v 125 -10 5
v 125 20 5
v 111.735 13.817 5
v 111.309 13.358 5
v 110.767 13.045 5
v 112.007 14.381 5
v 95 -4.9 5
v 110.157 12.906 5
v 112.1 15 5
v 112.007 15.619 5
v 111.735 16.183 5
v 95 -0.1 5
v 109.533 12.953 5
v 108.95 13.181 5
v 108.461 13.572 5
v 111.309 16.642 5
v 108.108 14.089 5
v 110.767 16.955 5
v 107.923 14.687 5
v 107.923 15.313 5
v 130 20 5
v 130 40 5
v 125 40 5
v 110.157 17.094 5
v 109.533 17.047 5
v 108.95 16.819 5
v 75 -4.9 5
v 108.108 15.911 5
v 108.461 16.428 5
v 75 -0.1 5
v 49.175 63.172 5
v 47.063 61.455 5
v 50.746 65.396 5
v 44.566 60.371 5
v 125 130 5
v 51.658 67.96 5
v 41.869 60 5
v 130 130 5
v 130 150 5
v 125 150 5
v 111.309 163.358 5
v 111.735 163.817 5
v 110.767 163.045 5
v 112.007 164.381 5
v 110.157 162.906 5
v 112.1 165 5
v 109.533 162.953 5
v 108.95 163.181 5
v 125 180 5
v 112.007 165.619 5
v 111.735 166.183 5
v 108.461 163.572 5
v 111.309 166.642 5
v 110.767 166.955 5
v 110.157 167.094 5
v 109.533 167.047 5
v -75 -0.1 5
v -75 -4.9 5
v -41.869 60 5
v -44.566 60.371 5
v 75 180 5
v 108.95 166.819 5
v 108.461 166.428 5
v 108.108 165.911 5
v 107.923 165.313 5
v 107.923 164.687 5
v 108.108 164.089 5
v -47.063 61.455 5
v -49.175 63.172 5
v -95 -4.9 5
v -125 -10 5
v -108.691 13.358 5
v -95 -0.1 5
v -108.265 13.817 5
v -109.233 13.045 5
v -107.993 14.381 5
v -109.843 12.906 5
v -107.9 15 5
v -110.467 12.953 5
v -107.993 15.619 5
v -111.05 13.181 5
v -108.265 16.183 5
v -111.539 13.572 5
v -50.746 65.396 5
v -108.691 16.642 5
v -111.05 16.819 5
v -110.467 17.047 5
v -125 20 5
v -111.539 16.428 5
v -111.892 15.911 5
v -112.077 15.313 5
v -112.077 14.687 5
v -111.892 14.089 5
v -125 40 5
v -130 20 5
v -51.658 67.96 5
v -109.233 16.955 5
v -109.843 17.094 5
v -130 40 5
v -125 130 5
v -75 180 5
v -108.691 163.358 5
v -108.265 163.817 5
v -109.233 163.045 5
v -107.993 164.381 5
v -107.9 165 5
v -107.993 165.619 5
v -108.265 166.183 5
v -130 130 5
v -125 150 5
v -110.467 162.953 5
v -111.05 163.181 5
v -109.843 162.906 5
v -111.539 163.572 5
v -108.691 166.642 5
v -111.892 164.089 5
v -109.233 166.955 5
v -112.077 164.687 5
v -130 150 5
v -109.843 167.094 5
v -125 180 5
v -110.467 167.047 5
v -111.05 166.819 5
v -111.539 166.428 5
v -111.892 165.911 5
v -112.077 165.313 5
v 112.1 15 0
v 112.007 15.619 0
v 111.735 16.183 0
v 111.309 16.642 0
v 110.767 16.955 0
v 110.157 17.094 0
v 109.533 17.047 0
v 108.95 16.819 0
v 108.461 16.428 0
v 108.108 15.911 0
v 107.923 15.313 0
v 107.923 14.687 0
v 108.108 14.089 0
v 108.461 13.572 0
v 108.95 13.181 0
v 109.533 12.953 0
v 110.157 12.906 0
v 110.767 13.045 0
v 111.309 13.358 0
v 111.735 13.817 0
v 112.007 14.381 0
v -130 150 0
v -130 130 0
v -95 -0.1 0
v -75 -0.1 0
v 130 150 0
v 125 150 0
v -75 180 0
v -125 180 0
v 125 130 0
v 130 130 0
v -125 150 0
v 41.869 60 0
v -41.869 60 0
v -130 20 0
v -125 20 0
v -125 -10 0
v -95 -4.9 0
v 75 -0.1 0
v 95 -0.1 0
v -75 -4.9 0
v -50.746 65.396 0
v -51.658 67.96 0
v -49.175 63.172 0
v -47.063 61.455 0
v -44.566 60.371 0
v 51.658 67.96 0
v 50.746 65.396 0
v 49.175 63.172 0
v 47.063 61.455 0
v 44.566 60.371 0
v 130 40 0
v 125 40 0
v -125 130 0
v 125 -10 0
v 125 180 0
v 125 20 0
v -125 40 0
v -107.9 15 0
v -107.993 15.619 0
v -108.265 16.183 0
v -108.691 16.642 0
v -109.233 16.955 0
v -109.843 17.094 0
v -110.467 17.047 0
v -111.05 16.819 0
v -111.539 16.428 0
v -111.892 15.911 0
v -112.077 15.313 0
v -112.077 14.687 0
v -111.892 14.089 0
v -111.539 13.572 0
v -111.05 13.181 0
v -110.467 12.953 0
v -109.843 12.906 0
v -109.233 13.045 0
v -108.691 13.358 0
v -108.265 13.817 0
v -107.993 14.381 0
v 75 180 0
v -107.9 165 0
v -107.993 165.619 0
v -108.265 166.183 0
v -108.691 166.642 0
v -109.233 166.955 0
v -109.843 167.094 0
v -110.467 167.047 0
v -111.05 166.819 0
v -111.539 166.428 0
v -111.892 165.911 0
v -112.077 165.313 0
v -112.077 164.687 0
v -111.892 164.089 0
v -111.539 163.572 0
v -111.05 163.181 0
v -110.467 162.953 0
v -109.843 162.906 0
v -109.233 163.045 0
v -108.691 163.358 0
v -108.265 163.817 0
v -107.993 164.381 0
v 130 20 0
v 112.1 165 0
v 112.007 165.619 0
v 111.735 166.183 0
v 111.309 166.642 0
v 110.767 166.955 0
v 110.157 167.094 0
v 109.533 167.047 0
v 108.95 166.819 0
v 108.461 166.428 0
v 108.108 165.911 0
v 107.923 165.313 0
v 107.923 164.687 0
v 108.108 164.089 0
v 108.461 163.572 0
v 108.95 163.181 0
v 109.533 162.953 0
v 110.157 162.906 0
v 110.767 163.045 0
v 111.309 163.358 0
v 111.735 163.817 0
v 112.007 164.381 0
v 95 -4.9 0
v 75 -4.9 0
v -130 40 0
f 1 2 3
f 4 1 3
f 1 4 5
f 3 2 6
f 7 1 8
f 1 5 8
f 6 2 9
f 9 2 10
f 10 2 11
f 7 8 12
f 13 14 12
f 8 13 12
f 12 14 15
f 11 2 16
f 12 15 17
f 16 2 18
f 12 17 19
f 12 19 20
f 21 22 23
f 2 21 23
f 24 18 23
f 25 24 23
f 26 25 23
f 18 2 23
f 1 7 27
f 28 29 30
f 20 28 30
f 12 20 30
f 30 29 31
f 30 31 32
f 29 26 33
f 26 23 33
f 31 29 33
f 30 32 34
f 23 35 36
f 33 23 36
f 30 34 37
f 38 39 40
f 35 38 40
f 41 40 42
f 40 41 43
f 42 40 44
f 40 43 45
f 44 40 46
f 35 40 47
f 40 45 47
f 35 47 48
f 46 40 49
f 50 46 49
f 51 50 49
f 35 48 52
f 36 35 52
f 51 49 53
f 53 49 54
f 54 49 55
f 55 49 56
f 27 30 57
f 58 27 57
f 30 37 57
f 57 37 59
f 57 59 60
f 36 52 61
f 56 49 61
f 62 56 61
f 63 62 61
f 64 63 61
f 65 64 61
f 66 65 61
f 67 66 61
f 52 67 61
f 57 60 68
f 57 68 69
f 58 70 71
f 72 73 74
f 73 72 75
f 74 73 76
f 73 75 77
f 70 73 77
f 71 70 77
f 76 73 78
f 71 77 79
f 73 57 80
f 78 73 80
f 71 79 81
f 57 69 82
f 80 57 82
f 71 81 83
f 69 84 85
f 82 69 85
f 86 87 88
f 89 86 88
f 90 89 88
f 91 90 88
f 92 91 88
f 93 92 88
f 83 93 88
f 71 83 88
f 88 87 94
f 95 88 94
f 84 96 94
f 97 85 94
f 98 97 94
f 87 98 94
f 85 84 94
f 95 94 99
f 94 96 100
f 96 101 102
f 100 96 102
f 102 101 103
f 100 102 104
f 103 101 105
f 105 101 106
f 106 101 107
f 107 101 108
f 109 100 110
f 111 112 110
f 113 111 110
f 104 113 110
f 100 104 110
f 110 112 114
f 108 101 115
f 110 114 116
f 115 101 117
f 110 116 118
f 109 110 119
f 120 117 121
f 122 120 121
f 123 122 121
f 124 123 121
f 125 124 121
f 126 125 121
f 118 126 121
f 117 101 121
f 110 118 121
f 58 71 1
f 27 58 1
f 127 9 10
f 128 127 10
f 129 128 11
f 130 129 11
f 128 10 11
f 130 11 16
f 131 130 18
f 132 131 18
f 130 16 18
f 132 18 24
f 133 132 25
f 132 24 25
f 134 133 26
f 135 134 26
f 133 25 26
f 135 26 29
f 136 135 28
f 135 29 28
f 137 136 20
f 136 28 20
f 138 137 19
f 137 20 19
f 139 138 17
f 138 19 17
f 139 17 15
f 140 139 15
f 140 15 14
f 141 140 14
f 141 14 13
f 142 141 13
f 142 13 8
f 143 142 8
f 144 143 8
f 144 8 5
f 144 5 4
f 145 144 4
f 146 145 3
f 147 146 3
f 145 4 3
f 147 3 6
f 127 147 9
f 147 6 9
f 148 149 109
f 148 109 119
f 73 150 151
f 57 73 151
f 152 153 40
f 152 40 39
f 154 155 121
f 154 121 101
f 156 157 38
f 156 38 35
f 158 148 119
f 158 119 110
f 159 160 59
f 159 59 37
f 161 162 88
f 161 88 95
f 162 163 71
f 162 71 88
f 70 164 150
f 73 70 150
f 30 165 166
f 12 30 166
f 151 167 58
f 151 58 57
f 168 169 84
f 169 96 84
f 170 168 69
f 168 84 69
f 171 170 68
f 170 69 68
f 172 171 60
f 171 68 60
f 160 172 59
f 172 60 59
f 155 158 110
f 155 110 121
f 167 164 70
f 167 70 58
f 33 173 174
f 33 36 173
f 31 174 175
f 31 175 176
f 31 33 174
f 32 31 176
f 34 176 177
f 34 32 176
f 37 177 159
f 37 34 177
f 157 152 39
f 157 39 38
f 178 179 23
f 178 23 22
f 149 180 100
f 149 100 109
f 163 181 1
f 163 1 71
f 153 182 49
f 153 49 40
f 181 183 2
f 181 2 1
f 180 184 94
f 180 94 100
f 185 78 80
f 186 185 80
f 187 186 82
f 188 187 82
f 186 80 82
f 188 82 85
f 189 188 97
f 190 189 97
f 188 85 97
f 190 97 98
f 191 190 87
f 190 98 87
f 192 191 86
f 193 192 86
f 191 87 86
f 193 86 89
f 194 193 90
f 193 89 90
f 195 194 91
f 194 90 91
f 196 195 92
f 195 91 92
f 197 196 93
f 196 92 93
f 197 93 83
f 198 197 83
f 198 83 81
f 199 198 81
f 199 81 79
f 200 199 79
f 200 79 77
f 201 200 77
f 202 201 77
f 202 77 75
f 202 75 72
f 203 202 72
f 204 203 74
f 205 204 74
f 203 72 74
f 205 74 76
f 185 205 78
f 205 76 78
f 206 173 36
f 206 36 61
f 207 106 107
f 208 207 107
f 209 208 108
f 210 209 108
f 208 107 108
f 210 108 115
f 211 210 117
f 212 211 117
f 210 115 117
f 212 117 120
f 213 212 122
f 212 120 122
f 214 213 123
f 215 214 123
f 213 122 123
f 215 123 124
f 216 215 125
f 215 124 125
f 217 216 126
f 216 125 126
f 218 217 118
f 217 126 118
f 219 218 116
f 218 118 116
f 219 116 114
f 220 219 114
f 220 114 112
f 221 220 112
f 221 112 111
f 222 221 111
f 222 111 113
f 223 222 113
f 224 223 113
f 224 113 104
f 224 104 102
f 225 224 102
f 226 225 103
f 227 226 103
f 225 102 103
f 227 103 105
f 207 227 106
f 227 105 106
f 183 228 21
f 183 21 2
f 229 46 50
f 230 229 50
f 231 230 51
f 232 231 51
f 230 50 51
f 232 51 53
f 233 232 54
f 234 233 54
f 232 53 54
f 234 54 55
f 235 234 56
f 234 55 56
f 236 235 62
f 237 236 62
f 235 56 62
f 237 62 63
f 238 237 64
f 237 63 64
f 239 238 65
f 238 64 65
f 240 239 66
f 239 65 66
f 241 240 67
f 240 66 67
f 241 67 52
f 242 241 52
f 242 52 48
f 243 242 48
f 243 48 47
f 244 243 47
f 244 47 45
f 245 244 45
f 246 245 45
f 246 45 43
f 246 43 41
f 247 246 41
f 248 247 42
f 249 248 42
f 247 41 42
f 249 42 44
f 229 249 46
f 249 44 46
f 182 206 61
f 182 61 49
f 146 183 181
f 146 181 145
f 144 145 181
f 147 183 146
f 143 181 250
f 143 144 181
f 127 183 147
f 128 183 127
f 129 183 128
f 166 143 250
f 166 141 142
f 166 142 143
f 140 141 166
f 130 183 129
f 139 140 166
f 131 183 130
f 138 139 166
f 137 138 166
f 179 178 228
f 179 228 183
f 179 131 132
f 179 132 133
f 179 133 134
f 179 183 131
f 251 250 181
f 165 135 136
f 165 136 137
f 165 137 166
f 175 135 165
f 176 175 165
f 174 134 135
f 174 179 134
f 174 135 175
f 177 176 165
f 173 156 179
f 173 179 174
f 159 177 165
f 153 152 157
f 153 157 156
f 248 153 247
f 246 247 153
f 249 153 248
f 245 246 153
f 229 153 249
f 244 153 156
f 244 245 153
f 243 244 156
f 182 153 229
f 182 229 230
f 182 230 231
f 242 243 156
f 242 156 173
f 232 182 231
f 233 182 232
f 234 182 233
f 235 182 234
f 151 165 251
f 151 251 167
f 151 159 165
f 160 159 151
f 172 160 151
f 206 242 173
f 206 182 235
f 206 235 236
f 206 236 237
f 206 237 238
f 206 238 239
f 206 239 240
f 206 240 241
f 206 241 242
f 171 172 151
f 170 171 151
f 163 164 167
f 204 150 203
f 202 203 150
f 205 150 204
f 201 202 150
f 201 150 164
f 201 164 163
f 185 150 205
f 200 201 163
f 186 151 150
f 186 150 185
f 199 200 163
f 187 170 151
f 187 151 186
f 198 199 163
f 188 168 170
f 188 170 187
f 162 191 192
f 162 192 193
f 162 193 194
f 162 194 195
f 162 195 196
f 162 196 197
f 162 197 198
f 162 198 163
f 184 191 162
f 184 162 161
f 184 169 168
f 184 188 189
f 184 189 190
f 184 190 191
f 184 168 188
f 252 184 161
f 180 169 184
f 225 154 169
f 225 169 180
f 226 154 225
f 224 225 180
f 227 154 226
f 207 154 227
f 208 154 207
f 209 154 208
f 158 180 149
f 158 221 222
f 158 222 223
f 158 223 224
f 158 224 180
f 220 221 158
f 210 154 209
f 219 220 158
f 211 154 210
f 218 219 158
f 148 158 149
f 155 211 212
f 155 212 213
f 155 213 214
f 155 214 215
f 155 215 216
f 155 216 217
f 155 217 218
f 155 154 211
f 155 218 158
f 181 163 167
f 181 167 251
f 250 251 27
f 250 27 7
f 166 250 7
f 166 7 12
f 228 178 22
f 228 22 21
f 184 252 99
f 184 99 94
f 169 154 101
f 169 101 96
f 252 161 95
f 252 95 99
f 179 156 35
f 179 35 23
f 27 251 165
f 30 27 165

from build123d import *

# Parameters (mm, degrees)
SKETCH1_W           = 20
SKETCH1_H           = 4.8
BOSS_EXTRUDE1_DEPTH = 5
FILLET1_R           = 10
SKETCH2_R           = 2.1
CUT_EXTRUDE1_DEPTH  = 5


with BuildPart() as part:
    # Sketch1 → Boss-Extrude1 (new body)
    with BuildSketch(Plane.XY):
        Polygon((125.000000001, -10), (-124.999999999, -10), (-124.999999999, 20), (-129.999999999, 20), (-129.999999999, 40), (-124.999999999, 40), (-124.999999999, 130), (-129.999999999, 130), (-129.999999999, 150), (-124.999999999, 150), (-124.999999999, 180), (-74.999999999, 180), (-50, 60), (50, 60), (75.000000001, 180), (125.000000001, 180), (125.000000001, 150), (130.000000001, 150), (130.000000001, 130), (125.000000001, 130), (125.000000001, 40), (130.000000001, 40), (130.000000001, 20), (125.000000001, 20), align=None)
        with Locations((85.000000001, -2.5)):
            Rectangle(SKETCH1_W, SKETCH1_H, mode=Mode.SUBTRACT)
        with Locations((-84.999999999, -2.5)):
            Rectangle(SKETCH1_W, SKETCH1_H, mode=Mode.SUBTRACT)
    extrude(amount=BOSS_EXTRUDE1_DEPTH)

    # Fillet1
    fillet1_edges = [part.edges().sort_by_distance(p)[0] for p in [
        (-50, 60, 2.5),
        (50, 60, 2.5),
    ]]
    fillet(fillet1_edges, radius=FILLET1_R)

    # Sketch2 → Cut-Extrude1 (cut)
    with BuildSketch(Plane.XY.offset(5)):
        with Locations((-109.999999999, 15)):
            Circle(SKETCH2_R)
        with Locations((110.000000001, 15)):
            Circle(SKETCH2_R)
        with Locations((110.000000001, 165)):
            Circle(SKETCH2_R)
        with Locations((-109.999999999, 165)):
            Circle(SKETCH2_R)
    extrude(amount=-CUT_EXTRUDE1_DEPTH, mode=Mode.SUBTRACT)


solid = part.part
